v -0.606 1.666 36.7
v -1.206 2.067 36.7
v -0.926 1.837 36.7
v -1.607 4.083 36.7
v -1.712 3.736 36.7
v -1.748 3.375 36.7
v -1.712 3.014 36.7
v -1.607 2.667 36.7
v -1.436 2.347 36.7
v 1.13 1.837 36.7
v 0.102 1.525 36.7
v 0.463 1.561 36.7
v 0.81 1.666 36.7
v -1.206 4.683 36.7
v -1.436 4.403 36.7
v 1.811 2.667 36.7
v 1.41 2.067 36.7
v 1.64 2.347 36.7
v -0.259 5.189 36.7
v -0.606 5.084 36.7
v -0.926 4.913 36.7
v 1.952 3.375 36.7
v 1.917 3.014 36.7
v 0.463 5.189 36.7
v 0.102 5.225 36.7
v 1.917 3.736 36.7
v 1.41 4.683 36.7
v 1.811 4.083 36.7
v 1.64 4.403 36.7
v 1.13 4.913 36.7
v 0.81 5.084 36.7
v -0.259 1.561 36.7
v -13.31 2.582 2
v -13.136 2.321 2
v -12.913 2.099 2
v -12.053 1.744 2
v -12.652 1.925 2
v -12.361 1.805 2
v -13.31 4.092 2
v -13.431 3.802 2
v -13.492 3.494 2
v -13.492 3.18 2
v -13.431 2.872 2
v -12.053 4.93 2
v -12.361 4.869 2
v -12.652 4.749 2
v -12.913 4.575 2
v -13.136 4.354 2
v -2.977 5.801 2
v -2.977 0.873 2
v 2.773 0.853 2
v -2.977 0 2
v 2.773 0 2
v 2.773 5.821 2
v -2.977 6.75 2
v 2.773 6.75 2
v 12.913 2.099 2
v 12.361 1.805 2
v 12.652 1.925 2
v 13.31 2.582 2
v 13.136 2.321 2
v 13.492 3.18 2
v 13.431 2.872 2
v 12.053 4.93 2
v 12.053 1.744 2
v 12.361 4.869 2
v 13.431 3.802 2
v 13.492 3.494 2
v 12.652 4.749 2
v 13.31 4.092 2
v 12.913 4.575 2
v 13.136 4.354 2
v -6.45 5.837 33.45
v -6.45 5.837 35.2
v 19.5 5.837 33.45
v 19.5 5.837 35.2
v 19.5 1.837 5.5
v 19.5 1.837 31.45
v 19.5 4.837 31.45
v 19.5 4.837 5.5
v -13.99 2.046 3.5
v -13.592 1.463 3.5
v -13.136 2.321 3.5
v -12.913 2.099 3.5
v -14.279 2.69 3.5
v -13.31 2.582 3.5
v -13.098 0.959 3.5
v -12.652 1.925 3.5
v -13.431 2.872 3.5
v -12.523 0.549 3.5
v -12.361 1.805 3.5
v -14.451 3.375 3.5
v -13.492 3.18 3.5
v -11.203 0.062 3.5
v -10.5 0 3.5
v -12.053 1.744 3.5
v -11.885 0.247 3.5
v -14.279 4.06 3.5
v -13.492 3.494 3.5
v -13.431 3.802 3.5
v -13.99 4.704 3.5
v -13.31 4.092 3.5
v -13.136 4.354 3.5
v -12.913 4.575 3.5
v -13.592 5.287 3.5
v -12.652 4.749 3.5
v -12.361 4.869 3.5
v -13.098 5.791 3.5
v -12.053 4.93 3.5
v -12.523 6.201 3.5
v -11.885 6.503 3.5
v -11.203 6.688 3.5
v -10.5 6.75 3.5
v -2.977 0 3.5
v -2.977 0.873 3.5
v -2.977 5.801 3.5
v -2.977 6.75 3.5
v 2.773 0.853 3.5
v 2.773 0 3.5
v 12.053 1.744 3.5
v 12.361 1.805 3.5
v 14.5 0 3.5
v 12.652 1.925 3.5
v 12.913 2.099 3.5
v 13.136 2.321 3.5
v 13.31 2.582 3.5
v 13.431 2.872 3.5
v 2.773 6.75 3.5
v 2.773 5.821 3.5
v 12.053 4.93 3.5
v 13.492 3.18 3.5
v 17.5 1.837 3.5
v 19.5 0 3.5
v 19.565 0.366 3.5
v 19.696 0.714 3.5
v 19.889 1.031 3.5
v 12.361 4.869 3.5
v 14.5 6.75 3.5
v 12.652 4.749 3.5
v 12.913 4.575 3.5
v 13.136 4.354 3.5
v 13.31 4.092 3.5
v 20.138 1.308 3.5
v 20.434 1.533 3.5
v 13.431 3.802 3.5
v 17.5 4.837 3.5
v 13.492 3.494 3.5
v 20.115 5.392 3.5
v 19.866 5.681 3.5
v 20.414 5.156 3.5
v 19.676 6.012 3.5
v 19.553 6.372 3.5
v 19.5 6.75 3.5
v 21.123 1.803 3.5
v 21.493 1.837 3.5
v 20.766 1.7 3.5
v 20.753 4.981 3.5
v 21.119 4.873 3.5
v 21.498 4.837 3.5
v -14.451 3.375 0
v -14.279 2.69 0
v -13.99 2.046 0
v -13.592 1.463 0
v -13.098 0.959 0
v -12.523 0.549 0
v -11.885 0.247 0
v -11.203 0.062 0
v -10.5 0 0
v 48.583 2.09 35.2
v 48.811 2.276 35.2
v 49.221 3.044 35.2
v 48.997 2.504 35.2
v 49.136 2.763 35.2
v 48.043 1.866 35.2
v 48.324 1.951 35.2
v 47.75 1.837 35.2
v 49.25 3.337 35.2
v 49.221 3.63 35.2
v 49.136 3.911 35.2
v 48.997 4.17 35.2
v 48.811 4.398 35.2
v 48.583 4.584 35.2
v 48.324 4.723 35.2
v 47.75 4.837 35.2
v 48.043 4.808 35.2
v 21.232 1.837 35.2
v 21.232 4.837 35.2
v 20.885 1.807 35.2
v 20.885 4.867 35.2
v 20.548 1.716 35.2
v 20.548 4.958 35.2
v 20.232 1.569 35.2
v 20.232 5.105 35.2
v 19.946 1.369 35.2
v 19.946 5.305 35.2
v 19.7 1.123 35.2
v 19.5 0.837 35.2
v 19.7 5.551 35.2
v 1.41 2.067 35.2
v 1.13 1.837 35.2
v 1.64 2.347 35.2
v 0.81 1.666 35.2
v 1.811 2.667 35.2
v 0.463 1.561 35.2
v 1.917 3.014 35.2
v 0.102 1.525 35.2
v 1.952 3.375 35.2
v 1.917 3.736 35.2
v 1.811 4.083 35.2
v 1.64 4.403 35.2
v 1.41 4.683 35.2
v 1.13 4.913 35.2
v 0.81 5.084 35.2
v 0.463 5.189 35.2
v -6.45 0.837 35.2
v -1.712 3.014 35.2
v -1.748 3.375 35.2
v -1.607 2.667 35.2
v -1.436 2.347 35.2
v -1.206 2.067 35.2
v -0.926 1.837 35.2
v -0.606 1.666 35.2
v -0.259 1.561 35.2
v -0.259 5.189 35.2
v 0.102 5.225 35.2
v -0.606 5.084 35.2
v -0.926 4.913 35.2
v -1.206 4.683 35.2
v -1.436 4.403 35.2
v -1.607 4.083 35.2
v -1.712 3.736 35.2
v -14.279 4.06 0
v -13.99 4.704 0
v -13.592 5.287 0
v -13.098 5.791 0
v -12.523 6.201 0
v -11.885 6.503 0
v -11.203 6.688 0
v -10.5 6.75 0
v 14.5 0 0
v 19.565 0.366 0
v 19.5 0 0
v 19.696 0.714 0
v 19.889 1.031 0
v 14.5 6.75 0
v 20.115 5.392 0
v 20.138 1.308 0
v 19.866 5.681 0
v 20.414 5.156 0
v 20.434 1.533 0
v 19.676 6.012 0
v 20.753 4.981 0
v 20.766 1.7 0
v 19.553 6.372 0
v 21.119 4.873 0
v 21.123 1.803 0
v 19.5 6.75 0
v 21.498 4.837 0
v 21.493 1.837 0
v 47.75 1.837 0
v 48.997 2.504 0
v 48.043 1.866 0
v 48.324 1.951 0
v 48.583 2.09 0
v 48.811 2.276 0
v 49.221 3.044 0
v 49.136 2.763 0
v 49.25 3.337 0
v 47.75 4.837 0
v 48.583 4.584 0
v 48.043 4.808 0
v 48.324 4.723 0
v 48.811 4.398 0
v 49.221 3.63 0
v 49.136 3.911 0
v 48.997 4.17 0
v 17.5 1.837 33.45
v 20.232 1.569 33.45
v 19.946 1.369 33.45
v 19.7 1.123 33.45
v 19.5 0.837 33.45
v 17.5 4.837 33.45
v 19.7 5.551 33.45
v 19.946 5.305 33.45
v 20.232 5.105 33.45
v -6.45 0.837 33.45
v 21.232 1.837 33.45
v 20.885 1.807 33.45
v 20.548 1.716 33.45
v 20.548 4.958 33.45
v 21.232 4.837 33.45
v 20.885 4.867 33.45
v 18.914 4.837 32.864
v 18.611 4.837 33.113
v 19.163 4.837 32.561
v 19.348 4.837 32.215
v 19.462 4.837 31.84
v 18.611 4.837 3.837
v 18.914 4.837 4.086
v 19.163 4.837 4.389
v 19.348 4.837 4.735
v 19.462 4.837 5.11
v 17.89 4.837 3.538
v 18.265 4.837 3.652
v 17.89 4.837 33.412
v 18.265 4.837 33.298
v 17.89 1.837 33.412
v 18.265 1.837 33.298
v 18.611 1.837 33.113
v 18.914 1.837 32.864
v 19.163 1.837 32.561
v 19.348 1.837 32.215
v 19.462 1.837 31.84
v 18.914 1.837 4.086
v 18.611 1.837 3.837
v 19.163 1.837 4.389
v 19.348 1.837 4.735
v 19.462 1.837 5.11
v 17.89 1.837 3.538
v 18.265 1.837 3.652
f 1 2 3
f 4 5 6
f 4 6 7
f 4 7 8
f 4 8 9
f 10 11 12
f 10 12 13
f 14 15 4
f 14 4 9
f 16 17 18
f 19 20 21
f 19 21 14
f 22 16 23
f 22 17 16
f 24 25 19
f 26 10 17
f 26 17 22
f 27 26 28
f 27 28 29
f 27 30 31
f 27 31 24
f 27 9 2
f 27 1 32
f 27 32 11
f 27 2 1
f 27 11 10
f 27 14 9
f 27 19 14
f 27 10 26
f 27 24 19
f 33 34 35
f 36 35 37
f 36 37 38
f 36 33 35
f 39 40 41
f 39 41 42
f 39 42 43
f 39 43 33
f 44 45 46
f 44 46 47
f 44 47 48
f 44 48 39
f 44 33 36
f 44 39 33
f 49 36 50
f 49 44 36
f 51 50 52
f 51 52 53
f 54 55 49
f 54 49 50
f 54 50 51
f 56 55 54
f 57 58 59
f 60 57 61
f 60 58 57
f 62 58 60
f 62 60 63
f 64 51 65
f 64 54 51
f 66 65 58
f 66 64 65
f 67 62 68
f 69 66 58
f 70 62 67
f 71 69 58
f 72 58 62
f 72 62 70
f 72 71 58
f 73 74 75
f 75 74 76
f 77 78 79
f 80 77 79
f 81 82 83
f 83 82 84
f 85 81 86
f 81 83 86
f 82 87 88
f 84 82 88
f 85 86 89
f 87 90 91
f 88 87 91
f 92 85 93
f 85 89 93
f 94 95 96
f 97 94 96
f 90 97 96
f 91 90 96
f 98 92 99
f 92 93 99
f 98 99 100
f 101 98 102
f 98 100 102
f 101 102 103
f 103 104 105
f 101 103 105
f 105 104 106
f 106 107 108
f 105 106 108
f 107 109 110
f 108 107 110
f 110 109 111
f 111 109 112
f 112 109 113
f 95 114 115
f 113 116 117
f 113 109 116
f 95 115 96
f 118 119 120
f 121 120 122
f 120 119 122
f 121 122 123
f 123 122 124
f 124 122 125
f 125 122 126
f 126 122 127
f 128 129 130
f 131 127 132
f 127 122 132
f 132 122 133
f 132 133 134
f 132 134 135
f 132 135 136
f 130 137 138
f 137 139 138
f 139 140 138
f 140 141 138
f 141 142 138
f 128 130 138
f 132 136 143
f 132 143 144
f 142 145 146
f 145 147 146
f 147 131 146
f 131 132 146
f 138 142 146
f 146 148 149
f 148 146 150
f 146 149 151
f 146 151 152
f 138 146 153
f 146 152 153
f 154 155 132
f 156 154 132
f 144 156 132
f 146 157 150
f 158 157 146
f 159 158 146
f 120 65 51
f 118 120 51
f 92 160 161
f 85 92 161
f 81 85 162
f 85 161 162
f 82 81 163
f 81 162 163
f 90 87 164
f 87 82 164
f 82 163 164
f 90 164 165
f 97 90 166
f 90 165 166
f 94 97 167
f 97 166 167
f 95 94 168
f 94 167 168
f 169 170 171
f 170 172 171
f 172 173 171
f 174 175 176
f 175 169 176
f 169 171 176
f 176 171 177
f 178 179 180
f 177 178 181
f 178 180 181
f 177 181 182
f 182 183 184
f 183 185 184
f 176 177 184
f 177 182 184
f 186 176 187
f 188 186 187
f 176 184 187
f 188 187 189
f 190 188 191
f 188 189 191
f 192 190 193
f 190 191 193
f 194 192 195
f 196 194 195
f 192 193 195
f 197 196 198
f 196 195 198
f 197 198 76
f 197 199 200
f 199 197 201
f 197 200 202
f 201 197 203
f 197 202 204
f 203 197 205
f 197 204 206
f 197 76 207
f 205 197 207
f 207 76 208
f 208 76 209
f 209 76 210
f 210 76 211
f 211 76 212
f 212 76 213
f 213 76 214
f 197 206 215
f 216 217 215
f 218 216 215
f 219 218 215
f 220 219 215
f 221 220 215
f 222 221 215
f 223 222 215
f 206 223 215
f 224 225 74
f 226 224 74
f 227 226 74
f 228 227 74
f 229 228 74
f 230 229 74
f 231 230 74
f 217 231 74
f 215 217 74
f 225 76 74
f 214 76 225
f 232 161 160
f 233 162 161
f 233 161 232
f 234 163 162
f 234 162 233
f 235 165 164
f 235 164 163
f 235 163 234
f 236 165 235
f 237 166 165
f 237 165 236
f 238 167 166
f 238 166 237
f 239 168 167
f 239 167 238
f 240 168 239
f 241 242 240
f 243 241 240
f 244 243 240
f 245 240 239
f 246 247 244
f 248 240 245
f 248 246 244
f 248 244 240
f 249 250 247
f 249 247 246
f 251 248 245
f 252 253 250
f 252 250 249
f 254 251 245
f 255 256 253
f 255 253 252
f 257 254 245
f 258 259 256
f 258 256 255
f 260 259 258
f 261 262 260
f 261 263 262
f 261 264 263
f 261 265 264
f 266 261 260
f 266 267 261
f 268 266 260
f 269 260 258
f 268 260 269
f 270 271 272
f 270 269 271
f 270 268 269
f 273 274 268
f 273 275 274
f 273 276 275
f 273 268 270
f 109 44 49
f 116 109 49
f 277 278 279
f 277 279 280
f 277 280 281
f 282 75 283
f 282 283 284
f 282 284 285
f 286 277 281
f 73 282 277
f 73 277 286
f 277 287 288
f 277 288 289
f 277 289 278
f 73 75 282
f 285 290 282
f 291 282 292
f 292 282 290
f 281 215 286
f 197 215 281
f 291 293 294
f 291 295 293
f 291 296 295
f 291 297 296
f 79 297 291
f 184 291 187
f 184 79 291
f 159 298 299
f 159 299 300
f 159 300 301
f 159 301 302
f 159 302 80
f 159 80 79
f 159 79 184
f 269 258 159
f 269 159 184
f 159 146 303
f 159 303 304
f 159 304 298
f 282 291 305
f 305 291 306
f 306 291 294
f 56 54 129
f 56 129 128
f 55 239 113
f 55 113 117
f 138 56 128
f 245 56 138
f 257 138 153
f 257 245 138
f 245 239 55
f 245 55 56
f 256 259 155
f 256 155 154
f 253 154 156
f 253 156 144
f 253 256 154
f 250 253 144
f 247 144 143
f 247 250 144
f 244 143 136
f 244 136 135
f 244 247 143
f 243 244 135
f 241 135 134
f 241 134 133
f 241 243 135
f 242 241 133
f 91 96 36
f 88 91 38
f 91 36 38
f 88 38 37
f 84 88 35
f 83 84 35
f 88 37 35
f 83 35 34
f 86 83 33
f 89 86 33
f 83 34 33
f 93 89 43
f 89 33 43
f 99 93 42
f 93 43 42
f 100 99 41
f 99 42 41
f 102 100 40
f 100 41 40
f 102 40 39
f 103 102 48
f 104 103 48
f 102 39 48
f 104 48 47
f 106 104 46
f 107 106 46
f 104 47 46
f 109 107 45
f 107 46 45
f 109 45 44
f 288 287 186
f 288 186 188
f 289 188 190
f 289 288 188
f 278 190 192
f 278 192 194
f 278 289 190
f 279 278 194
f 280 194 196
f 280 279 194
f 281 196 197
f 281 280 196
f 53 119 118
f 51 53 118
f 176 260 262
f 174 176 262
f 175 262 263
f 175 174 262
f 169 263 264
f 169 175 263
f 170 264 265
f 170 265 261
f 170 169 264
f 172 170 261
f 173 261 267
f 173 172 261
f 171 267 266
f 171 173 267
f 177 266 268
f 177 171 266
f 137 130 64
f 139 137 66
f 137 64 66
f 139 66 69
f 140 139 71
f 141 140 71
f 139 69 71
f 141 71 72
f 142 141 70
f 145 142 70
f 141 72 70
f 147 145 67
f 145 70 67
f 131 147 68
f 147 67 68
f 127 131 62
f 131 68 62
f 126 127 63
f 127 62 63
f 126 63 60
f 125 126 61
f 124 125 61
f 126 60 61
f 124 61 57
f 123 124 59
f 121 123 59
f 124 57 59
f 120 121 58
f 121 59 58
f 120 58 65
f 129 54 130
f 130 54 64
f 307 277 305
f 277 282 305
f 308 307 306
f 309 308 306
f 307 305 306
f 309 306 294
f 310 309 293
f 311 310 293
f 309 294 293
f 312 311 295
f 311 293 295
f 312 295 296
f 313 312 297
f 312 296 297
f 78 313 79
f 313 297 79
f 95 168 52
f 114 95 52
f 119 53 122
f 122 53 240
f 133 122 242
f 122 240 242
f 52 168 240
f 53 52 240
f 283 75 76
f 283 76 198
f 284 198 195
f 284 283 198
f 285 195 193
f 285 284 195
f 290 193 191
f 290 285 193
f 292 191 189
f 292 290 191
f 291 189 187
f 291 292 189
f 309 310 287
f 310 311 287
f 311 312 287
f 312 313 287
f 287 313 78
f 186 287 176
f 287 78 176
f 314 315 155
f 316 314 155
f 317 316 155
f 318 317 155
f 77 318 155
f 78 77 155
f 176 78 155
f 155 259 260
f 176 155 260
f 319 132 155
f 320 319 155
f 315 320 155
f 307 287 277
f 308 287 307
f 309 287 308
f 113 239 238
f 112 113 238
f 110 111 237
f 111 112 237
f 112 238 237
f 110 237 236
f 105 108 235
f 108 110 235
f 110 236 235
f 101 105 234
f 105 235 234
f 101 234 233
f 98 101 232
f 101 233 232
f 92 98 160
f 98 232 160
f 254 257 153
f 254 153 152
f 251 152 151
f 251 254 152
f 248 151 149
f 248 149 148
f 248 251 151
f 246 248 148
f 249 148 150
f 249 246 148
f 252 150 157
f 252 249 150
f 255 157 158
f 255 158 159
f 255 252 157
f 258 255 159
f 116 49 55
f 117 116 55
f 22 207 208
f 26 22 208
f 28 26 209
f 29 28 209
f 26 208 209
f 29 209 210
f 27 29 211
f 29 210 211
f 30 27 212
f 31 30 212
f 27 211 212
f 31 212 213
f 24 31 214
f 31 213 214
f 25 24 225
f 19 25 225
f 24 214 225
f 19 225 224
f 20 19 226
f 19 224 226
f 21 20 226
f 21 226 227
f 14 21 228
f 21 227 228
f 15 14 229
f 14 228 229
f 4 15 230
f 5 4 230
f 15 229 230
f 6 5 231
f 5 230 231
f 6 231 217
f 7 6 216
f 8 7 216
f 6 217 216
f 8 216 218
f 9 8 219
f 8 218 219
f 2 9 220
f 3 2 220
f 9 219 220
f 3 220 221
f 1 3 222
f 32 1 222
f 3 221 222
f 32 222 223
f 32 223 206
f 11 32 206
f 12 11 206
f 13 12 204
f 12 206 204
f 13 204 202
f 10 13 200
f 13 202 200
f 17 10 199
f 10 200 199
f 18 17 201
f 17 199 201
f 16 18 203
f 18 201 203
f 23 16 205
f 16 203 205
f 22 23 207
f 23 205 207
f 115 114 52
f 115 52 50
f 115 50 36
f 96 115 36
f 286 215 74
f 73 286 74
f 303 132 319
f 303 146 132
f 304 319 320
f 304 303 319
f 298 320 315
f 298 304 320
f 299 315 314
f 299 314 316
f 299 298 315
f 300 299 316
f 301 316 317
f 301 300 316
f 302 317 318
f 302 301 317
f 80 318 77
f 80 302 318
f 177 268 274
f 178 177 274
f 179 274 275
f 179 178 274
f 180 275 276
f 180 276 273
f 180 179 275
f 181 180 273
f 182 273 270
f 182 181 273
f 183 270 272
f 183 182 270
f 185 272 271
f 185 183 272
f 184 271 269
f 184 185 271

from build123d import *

# Parameters (mm, degrees)
SKETCH1_W            = 29
SKETCH1_H            = 6.75
BOSS_EXTRUDE10_DEPTH = 3.5
SKETCH1_16_R         = 0.291434634
BOSS_EXTRUDE15_DEPTH = 2
SKETCH1_17_W         = 29.75
SKETCH1_17_H         = 3
BOSS_EXTRUDE17_DEPTH = 35.2
SKETCH1_18_W         = 5
SKETCH1_18_H         = 1.912928139
SKETCH1_18_H_2       = 3
SKETCH1_18_H_3       = 1.837071861
BOSS_EXTRUDE20_DEPTH = 3.5
SKETCH2_W            = 25.95
SKETCH2_H            = 5
BOSS_EXTRUDE18_DEPTH = 1.75
FILLET1_R            = 2
FILLET3_R            = 2
FILLET2_R            = 4
SKETCH3_W            = 5.75
SKETCH3_H            = 1.125
CUT_EXTRUDE1_DEPTH   = 1.5
SKETCH4_R            = 1.85
BOSS_EXTRUDE19_DEPTH = 1.5
FILLET4_R            = 1.5


# Some blends are built 0.0001 mm under size
with BuildPart() as part:
    # Sketch1 → Boss-Extrude10 (new body)
    with BuildSketch(Plane.XY):
        with Locations((0, 3.375)):
            Rectangle(SKETCH1_W, SKETCH1_H)
        with BuildLine():
            Line((-12.052929028, 4.929746565), (0, 6.087071861))
            Line((0, 6.087071861), (12.052929028, 4.929746565))
            ThreePointArc((12.052929028, 4.929746565), (13.5, 3.337071861), (12.052929028, 1.744397157))
            Line((12.052929028, 1.744397157), (0, 0.587071861))
            Line((0, 0.587071861), (-12.052929028, 1.744397157))
            ThreePointArc((-12.052929028, 1.744397157), (-13.5, 3.337071861), (-12.052929028, 4.929746565))
        make_face(mode=Mode.SUBTRACT)
    extrude(amount=BOSS_EXTRUDE10_DEPTH)

    # Sketch1<16> → Boss-Extrude15 (add)
    # profile 1 of 9: a face of its own
    with BuildSketch(Plane.XY):
        with BuildLine():
            Line((-0.523286746, 6.036825735), (-12.052929028, 4.929746565))
            ThreePointArc((-12.052929028, 4.929746565), (-13.5, 3.337071861), (-12.052929028, 1.744397157))
            Line((-12.052929028, 1.744397157), (-0.523286746, 0.637317987))
            ThreePointArc((-0.523286746, 0.637317987), (-2.75, 3.337071861), (-0.523286746, 6.036825735))
        make_face()
        with Locations((-11.9, 3.337071861)):
            Circle(SKETCH1_16_R, mode=Mode.SUBTRACT)
        with Locations((-9.863185408, 3.337071861)):
            Circle(SKETCH1_16_R, mode=Mode.SUBTRACT)
        with Locations((-7.826370816, 3.337071861)):
            Circle(SKETCH1_16_R, mode=Mode.SUBTRACT)
    # profile 2 of 9: a face of its own
    with BuildSketch(Plane.XY):
        with Locations((-11.9, 3.337071861)):
            Circle(SKETCH1_16_R)
    # profile 3 of 9: a face of its own
    with BuildSketch(Plane.XY):
        with Locations((-7.826370816, 3.337071861)):
            Circle(SKETCH1_16_R)
    # profile 4 of 9: a face of its own
    with BuildSketch(Plane.XY):
        with Locations((-9.863185408, 3.337071861)):
            Circle(SKETCH1_16_R)
    # profile 5 of 9: a face of its own
    with BuildSketch(Plane.XY):
        with BuildLine():
            Line((0, 6.087071861), (-0.523286746, 6.036825735))
            ThreePointArc((-0.523286746, 6.036825735), (-2.75, 3.337071861), (-0.523286746, 0.637317987))
            Line((-0.523286746, 0.637317987), (0, 0.587071861))
            Line((0, 0.587071861), (0.523286746, 0.637317987))
            ThreePointArc((0.523286746, 0.637317987), (2.121501656, 1.587291668), (2.75, 3.337071861))
            ThreePointArc((2.75, 3.337071861), (2.121501656, 5.086852054), (0.523286746, 6.036825735))
            Line((0.523286746, 6.036825735), (0, 6.087071861))
        make_face()
    # profile 6 of 9: a face of its own
    with BuildSketch(Plane.XY):
        with BuildLine():
            Line((12.052929028, 4.929746565), (0.523286746, 6.036825735))
            ThreePointArc((0.523286746, 6.036825735), (2.121501656, 5.086852054), (2.75, 3.337071861))
            ThreePointArc((2.75, 3.337071861), (2.121501656, 1.587291668), (0.523286746, 0.637317987))
            Line((0.523286746, 0.637317987), (12.052929028, 1.744397157))
            ThreePointArc((12.052929028, 1.744397157), (13.5, 3.337071861), (12.052929028, 4.929746565))
        make_face()
        with Locations((7.826370816, 3.337071861)):
            Circle(SKETCH1_16_R, mode=Mode.SUBTRACT)
        with Locations((9.863185408, 3.337071861)):
            Circle(SKETCH1_16_R, mode=Mode.SUBTRACT)
        with Locations((11.9, 3.337071861)):
            Circle(SKETCH1_16_R, mode=Mode.SUBTRACT)
    # profile 7 of 9: a face of its own
    with BuildSketch(Plane.XY):
        with Locations((11.9, 3.337071861)):
            Circle(SKETCH1_16_R)
    # profile 8 of 9: a face of its own
    with BuildSketch(Plane.XY):
        with Locations((9.863185408, 3.337071861)):
            Circle(SKETCH1_16_R)
    # profile 9 of 9: a face of its own
    with BuildSketch(Plane.XY):
        with Locations((7.826370816, 3.337071861)):
            Circle(SKETCH1_16_R)
    extrude(amount=BOSS_EXTRUDE15_DEPTH)



with BuildPart() as body_2:
    # Sketch1<17> → Boss-Extrude17 (new body)
    with BuildSketch(Plane.XY):
        with Locations((34.375, 3.337071861)):
            Rectangle(SKETCH1_17_W, SKETCH1_17_H)
    extrude(amount=BOSS_EXTRUDE17_DEPTH)


with BuildPart() as part_1:
    add(part.part)

    add(body_2.part)  # Boss-Extrude20 merges body 2
    # Sketch1<18> → Boss-Extrude20 (add)
    with BuildSketch(Plane.XY):
        with Locations((17, 5.793535931)):
            Rectangle(SKETCH1_18_W, SKETCH1_18_H)
        with Locations((17, 3.337071861)):
            Rectangle(SKETCH1_18_W, SKETCH1_18_H_2)
        with Locations((17, 0.918535931)):
            Rectangle(SKETCH1_18_W, SKETCH1_18_H_3)
    extrude(amount=BOSS_EXTRUDE20_DEPTH)

    # Sketch2 → Boss-Extrude18 (add)
    with BuildSketch(Plane.XY.offset(35.2)):
        with Locations((6.525, 3.337071861)):
            Rectangle(SKETCH2_W, SKETCH2_H)
    extrude(amount=-BOSS_EXTRUDE18_DEPTH)

    # Fillet1
    # the kernel refuses this fillet: 2 mm, written as the material it adds along each edge
    with BuildSketch(Plane(origin=(19.5, 4.837071861, 33.45), x_dir=(1, 0, 0), z_dir=(0, 0, 1))) as fillet1_piece_1:
        with BuildLine():
            CenterArc((1.732050808, 2), FILLET1_R, 210, 60)
            Line((0, 1), (0, 0))
            Line((0, 0), (1.732050808, 0))
        make_face()
    extrude(amount=1.75)
    with BuildSketch(Plane(origin=(19.5, 4.837071861, 0), x_dir=(0, 1, 0), z_dir=(0, 0, 1))) as fillet1_piece_2:
        with BuildLine():
            CenterArc((2, -1.998103724), FILLET1_R, 92.495213733, 87.504786267)
            Line((0, -1.998103724), (0, 0))
            Line((0, 0), (1.912928139, 0))
        make_face()
    extrude(amount=3.5)
    with BuildSketch(Plane(origin=(19.5, 1.837071861, 33.45), x_dir=(1, 0, 0), z_dir=(0, 0, 1))) as fillet1_piece_3:
        with BuildLine():
            CenterArc((1.732050808, -2), FILLET1_R, 90, 60)
            Line((0, -1), (0, 0))
            Line((0, 0), (1.732050808, 0))
        make_face()
    extrude(amount=1.75)
    with BuildSketch(Plane(origin=(19.5, 1.837071861, 0), x_dir=(0, -1, 0), z_dir=(0, 0, 1))) as fillet1_piece_4:
        with BuildLine():
            CenterArc((2, 1.993352558), FILLET1_R, 180, 85.327274549)
            Line((0, 1.993352558), (0, 0))
            Line((0, 0), (1.837071861, 0))
        make_face()
    extrude(amount=3.5)

    # Fillet3
    fillet3_edges = [part_1.edges().sort_by_distance(p)[0] for p in [
        (19.5, 3.337071861, 3.5),
        (19.5, 3.337071861, 33.45),
    ]]
    fillet(fillet3_edges, radius=FILLET3_R)

    # Fillet2
    # the kernel refuses this fillet: 4 mm, written as the material it takes off along each edge
    with BuildSketch(Plane(origin=(-14.5, 6.75, -10), x_dir=(1, 0, 0), z_dir=(0, 0, 1)), Plane(origin=(-14.5, 0, -10), x_dir=(0, 1, 0), z_dir=(0, 0, 1))) as fillet2_piece_1:
        with BuildLine():
            CenterArc((FILLET2_R, -FILLET2_R), FILLET2_R, 90, 90)
            Line((0, -FILLET2_R), (0, 0))
            Line((0, 0), (FILLET2_R, 0))
        make_face()
    extrude(amount=23.5, mode=Mode.SUBTRACT)

    # Sketch3 → Cut-Extrude1 (cut)
    with BuildSketch(Plane.XY.offset(3.5)):
        with Locations((-0.102107464, 6.1875)):
            Rectangle(SKETCH3_W, SKETCH3_H)
        with Locations((-0.102107464, 0.5625)):
            Rectangle(SKETCH3_W, SKETCH3_H)
    extrude(amount=-CUT_EXTRUDE1_DEPTH, mode=Mode.SUBTRACT)

    # Sketch4 → Boss-Extrude19 (add)
    with BuildSketch(Plane.XY.offset(35.2)):
        with Locations((0.102107464, 3.375)):
            Circle(SKETCH4_R)
    extrude(amount=BOSS_EXTRUDE19_DEPTH)

    # Fillet4
    fillet4_edges = [part_1.edges().sort_by_distance(p)[0] for p in [
        (49.25, 4.837071861, 17.6),
        (49.25, 1.837071861, 17.6),
    ]]
    fillet(fillet4_edges, radius=FILLET4_R - 0.0001)  # a hair under: the kernel refuses the full size


solid = part_1.part
